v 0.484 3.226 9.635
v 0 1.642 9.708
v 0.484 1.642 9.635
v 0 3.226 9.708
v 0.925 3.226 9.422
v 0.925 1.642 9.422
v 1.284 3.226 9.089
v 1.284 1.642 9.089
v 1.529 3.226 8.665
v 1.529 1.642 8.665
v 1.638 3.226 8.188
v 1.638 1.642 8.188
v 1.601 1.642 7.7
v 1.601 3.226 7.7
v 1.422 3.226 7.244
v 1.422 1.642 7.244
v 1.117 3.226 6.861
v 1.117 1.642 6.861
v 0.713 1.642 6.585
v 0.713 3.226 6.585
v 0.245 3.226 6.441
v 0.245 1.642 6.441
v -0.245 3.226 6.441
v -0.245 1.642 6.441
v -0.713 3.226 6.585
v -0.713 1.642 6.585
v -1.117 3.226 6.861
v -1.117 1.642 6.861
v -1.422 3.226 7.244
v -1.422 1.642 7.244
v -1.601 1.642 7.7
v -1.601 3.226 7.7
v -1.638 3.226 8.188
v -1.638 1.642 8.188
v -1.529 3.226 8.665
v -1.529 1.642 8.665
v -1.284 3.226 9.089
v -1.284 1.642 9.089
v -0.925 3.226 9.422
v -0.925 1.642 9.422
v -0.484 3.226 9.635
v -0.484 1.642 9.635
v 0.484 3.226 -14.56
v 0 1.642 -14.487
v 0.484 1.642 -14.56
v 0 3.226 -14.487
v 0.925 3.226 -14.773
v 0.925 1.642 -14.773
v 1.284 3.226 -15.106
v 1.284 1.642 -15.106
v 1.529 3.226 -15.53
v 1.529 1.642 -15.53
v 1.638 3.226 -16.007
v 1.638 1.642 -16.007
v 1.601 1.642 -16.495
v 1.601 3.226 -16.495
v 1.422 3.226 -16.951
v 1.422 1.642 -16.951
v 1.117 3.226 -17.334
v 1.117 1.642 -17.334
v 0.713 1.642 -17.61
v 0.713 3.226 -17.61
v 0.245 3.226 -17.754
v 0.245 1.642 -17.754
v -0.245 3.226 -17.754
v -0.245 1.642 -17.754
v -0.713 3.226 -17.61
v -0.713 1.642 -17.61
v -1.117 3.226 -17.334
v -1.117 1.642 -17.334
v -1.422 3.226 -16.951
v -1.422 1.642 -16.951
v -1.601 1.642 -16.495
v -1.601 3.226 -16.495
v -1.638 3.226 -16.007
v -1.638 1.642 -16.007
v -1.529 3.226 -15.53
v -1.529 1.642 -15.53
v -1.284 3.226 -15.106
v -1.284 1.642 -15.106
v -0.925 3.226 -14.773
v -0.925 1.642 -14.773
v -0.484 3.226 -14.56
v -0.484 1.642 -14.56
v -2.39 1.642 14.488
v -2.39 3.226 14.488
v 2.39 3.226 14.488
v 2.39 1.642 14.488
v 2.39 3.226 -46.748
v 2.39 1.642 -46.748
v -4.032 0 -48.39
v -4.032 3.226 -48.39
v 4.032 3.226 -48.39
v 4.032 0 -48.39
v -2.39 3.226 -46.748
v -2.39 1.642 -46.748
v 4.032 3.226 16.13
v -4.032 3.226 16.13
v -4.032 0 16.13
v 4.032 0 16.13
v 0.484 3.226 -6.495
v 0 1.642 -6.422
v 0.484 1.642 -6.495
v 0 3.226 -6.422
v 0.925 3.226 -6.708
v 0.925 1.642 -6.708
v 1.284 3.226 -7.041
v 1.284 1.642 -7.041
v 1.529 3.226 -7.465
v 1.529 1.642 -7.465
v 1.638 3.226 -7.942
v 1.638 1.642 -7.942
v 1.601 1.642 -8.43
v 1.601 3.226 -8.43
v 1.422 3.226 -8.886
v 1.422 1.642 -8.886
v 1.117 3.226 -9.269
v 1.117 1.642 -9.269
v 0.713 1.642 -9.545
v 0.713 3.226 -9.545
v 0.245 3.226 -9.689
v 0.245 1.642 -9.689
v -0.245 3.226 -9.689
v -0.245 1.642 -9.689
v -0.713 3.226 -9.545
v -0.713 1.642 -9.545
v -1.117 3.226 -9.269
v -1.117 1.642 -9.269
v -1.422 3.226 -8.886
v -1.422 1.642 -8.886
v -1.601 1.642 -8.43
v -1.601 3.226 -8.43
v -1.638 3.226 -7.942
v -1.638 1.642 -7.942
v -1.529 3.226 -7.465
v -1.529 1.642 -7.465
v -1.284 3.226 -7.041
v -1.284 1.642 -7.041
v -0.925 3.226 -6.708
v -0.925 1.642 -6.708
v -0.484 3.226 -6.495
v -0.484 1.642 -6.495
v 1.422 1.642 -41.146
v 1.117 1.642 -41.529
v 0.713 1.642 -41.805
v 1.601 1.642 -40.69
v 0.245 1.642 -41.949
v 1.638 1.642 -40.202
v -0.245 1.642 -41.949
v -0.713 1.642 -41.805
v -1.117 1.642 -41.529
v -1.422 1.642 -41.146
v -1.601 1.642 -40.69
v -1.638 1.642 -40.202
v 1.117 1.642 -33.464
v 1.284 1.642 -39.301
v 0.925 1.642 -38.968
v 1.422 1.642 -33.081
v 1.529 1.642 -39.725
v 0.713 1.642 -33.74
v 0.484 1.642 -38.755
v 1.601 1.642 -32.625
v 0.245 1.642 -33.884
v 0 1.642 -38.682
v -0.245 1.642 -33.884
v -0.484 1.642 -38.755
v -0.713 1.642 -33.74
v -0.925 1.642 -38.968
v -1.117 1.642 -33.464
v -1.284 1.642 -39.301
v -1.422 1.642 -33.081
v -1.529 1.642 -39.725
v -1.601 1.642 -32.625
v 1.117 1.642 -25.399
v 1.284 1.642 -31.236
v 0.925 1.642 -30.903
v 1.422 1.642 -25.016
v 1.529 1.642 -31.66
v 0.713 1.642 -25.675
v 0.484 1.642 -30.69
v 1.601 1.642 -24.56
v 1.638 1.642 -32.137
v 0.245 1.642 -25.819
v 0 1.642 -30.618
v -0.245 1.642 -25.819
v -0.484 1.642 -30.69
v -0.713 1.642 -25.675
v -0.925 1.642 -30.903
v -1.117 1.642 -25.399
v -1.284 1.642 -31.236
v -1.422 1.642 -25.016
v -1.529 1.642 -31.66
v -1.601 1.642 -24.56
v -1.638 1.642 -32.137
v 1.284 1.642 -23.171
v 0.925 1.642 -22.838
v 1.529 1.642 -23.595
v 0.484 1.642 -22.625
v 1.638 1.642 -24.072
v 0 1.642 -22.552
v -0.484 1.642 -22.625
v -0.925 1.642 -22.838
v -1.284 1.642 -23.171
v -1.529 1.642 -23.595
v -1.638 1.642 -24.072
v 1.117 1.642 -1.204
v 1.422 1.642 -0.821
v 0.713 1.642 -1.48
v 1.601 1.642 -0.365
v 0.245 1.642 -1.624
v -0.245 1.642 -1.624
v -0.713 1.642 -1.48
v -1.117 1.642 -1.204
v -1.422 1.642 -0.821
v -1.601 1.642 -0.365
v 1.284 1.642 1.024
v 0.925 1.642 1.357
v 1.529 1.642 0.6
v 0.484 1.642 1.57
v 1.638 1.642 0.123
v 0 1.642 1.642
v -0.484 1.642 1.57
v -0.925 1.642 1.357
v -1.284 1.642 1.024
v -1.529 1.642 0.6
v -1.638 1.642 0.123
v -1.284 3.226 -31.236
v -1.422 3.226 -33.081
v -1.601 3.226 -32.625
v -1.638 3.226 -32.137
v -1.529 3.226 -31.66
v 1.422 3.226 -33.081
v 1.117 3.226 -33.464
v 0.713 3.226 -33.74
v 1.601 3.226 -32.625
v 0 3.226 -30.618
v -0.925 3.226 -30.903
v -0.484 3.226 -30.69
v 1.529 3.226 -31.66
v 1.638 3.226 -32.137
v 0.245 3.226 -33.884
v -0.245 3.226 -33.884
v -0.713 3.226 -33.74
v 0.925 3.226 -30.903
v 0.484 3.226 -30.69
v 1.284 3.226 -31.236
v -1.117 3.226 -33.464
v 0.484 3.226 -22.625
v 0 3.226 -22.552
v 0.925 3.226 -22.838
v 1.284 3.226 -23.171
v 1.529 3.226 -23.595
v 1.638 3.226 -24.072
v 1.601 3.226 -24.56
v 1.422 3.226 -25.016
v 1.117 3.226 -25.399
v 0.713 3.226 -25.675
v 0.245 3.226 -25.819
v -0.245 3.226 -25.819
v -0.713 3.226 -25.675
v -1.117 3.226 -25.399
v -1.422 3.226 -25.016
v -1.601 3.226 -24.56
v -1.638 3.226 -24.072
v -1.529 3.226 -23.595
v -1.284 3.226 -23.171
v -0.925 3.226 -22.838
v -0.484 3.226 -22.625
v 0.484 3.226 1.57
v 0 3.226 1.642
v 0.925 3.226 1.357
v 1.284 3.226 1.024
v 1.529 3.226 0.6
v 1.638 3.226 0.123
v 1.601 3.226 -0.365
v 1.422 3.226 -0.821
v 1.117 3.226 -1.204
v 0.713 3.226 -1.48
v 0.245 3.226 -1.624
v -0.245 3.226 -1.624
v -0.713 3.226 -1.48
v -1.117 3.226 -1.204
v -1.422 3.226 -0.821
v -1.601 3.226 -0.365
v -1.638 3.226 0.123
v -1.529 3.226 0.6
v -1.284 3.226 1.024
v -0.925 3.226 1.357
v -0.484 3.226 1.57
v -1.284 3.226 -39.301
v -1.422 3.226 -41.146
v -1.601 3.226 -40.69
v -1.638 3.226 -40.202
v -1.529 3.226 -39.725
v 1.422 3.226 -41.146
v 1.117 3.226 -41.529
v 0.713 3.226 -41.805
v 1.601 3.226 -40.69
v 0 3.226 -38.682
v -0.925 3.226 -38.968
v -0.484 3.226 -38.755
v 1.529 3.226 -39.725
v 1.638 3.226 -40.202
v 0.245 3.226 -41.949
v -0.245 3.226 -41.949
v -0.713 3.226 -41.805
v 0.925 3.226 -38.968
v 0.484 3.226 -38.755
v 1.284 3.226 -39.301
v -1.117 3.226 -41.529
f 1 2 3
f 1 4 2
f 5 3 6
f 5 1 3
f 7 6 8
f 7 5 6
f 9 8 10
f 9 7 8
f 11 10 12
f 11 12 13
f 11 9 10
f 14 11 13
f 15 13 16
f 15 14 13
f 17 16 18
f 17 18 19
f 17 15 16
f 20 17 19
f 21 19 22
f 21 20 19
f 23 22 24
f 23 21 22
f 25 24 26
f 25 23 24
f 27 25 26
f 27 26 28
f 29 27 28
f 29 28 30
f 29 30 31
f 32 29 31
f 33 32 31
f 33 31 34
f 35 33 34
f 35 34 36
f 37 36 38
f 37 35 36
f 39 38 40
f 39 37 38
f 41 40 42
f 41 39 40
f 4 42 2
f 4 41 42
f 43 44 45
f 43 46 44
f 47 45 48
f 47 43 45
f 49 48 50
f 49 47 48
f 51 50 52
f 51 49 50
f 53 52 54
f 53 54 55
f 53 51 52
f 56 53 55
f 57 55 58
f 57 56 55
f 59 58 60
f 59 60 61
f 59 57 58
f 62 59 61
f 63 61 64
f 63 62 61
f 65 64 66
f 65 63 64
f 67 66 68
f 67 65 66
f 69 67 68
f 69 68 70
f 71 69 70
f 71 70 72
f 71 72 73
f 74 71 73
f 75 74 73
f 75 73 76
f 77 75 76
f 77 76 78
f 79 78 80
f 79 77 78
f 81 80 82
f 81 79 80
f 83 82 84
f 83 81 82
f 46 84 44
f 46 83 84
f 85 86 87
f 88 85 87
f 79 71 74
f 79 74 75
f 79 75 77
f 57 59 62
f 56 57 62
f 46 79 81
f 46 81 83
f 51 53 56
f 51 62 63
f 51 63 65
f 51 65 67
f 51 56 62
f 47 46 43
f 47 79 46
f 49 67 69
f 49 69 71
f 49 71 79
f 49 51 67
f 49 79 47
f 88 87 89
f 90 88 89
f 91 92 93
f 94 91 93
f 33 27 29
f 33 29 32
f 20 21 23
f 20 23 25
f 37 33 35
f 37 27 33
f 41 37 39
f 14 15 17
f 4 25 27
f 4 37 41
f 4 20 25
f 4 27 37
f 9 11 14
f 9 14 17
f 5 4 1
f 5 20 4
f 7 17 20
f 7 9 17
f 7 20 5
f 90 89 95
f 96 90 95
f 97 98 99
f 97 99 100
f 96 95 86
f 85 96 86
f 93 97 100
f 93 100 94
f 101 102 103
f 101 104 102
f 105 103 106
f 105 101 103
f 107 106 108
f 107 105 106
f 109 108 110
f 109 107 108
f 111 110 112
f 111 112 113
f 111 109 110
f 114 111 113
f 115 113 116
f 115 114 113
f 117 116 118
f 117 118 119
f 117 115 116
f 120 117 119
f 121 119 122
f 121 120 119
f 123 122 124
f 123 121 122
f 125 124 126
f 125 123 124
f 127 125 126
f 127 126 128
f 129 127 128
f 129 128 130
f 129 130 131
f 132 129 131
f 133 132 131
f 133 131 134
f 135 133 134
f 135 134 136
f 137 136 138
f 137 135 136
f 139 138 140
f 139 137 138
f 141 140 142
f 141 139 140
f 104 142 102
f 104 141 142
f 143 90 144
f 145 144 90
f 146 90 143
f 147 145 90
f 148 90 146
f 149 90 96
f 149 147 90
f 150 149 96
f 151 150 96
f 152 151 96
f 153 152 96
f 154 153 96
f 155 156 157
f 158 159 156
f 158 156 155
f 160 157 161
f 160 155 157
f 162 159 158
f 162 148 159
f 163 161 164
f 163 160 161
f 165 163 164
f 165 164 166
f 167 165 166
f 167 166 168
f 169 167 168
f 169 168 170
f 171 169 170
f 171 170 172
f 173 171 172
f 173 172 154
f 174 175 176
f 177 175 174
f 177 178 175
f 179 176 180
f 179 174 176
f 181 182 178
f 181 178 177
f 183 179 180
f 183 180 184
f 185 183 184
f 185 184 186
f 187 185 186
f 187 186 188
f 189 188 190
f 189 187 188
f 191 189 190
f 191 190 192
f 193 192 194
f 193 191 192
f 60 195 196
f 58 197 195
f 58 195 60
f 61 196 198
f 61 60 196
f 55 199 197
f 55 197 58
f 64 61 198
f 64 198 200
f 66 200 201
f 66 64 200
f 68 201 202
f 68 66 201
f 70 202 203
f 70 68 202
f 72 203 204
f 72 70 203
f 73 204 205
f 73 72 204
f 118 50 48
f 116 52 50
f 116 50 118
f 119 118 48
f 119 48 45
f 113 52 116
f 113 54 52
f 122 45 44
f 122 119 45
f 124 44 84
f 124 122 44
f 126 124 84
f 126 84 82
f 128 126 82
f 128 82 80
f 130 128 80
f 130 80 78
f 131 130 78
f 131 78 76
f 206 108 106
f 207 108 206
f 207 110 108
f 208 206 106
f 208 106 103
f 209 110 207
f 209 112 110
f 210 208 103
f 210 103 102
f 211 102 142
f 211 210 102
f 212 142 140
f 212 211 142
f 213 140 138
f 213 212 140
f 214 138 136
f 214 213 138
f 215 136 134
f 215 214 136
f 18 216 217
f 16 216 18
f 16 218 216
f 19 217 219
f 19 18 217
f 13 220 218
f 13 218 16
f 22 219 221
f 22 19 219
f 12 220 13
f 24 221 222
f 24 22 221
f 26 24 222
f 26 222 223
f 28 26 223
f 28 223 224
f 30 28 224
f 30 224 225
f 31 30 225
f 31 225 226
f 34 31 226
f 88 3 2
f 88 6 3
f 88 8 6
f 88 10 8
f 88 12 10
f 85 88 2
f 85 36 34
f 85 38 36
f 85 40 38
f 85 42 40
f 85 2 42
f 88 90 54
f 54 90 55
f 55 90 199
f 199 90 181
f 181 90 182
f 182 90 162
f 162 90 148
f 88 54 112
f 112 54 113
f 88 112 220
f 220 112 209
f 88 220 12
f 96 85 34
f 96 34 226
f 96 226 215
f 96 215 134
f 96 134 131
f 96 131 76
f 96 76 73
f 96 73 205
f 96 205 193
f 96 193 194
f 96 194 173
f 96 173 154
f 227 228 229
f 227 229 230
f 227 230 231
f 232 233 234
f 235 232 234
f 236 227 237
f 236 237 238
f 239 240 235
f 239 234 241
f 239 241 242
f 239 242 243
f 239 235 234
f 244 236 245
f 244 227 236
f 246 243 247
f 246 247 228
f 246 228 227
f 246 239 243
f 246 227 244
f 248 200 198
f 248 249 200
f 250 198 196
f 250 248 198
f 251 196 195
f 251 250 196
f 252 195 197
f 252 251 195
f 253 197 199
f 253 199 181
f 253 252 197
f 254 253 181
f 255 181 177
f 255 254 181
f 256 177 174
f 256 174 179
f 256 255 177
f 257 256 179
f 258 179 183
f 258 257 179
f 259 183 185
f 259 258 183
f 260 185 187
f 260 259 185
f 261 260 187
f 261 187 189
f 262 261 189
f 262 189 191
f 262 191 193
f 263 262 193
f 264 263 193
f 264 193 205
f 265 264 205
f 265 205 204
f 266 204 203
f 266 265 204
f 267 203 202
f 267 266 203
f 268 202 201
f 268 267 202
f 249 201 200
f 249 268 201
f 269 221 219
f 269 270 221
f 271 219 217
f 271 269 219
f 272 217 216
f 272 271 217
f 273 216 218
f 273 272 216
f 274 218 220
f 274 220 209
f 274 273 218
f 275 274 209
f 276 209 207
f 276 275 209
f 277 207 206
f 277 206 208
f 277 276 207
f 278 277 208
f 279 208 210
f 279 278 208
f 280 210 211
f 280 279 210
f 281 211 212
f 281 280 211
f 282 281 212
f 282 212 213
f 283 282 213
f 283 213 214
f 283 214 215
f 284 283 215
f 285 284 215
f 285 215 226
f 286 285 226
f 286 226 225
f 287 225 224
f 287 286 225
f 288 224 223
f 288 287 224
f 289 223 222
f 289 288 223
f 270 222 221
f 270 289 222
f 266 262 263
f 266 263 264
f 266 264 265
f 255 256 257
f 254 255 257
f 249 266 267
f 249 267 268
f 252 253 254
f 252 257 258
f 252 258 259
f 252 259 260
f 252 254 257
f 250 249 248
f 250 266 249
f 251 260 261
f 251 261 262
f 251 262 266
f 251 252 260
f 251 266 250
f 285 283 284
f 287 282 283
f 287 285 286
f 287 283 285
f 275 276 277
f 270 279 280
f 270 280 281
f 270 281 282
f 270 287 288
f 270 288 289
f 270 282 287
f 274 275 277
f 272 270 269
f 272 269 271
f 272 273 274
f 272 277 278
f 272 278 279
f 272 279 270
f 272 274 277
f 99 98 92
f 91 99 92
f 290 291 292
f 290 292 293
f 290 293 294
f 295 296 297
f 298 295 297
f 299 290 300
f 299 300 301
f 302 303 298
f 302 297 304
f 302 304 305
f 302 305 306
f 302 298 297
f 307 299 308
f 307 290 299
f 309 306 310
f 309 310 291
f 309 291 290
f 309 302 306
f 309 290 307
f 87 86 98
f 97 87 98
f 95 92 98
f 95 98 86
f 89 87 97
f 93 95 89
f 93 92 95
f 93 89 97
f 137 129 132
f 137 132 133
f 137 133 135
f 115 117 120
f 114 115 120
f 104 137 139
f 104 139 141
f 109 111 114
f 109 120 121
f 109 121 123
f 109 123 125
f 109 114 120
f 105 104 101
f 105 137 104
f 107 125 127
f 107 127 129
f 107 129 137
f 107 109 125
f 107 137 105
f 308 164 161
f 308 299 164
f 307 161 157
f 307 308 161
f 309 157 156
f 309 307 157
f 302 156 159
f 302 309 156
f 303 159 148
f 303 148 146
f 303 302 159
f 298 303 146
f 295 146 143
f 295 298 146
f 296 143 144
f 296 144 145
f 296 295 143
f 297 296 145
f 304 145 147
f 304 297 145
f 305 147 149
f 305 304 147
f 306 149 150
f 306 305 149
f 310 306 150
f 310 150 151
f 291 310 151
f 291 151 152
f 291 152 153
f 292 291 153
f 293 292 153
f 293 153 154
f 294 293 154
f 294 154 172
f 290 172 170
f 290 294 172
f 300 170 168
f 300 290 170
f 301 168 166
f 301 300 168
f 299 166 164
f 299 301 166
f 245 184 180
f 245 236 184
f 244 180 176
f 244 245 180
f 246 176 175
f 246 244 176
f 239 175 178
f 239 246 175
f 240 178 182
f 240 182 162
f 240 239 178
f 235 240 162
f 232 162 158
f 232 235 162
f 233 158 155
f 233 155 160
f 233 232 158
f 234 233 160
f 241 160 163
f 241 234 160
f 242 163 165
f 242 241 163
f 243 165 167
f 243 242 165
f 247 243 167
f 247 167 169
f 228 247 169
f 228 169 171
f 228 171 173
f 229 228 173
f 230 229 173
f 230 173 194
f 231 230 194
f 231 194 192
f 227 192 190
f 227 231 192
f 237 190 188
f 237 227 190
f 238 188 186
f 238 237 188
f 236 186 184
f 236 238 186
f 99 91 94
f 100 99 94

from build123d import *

# Parameters (mm, degrees)
SKETCH1_W           = 8.065
SKETCH1_H           = 64.52
BOSS_EXTRUDE1_DEPTH = 3.226
CUT_EXTRUDE1_DEPTH  = 1.5835
SKETCH7_W           = 1.6425
SKETCH7_H           = 1.5835
SKETCH8_W           = 1.6425
SKETCH8_H           = 1.5835
SKETCH9_W           = 1.6425
SKETCH9_H           = 1.5835
LPATTERN1_COUNT     = 5
LPATTERN1_PITCH     = 8.065


with BuildPart() as part:
    # Sketch1 → Boss-Extrude1 (new body)
    with BuildSketch(Plane(origin=(0, 3.226, 0), x_dir=(1, 0, 0), z_dir=(0, 1, 0))):
        with Locations((0, 16.13)):
            Rectangle(SKETCH1_W, SKETCH1_H)
    extrude(amount=-BOSS_EXTRUDE1_DEPTH)

    # Sketch2 → Cut-Extrude1 (cut)
    with BuildSketch(Plane(origin=(0, 3.226, 0), x_dir=(-1, 0, 0), z_dir=(0, 1, 0))):
        Polygon((2.39, 14.4875), (-2.39, 14.4875), (-2.39, -14.4875), (-2.39, -46.7475), (2.39, -46.7475), (2.39, -14.4875), align=None)
    extrude(amount=-CUT_EXTRUDE1_DEPTH, mode=Mode.SUBTRACT)

    # Sketch7 → Revolve5 (revolve)
    with BuildSketch(Plane(origin=(0, 0, -8.065), x_dir=(-1, 0, 0), z_dir=(0, 0, -1)), mode=Mode.PRIVATE) as revolve5_sk:
        with Locations((-0.82125, 2.43425)):
            Rectangle(SKETCH7_W, SKETCH7_H)
    revolve5 = revolve(revolve5_sk.sketch.rotate(Axis((0, 1.6425, -8.065), (0, 1, 0)), 270), axis=Axis((0, 1.6425, -8.065), (0, 1, 0)))

    # Sketch8 → Revolve6 (revolve)
    with BuildSketch(Plane(origin=(0, 0, 0), x_dir=(-1, 0, 0), z_dir=(0, 0, -1)), mode=Mode.PRIVATE) as revolve6_sk:
        with Locations((-0.82125, 2.43425)):
            Rectangle(SKETCH8_W, SKETCH8_H)
    revolve(revolve6_sk.sketch.rotate(Axis((0, 1.6425, 0), (0, 1, 0)), 270), axis=Axis((0, 1.6425, 0), (0, 1, 0)))

    # Sketch9 → Revolve7 (revolve)
    with BuildSketch(Plane(origin=(0, 0, 8.065), x_dir=(-1, 0, 0), z_dir=(0, 0, -1)), mode=Mode.PRIVATE) as revolve7_sk:
        with Locations((-0.82125, 2.43425)):
            Rectangle(SKETCH9_W, SKETCH9_H)
    revolve(revolve7_sk.sketch.rotate(Axis((0, 1.6425, 8.065), (0, 1, 0)), 270), axis=Axis((0, 1.6425, 8.065), (0, 1, 0)))

    # LPattern1: Revolve5 ×5
    with Locations(*[(0, 0, -i * LPATTERN1_PITCH) for i in range(1, LPATTERN1_COUNT)]):
        add(revolve5)


solid = part.part
